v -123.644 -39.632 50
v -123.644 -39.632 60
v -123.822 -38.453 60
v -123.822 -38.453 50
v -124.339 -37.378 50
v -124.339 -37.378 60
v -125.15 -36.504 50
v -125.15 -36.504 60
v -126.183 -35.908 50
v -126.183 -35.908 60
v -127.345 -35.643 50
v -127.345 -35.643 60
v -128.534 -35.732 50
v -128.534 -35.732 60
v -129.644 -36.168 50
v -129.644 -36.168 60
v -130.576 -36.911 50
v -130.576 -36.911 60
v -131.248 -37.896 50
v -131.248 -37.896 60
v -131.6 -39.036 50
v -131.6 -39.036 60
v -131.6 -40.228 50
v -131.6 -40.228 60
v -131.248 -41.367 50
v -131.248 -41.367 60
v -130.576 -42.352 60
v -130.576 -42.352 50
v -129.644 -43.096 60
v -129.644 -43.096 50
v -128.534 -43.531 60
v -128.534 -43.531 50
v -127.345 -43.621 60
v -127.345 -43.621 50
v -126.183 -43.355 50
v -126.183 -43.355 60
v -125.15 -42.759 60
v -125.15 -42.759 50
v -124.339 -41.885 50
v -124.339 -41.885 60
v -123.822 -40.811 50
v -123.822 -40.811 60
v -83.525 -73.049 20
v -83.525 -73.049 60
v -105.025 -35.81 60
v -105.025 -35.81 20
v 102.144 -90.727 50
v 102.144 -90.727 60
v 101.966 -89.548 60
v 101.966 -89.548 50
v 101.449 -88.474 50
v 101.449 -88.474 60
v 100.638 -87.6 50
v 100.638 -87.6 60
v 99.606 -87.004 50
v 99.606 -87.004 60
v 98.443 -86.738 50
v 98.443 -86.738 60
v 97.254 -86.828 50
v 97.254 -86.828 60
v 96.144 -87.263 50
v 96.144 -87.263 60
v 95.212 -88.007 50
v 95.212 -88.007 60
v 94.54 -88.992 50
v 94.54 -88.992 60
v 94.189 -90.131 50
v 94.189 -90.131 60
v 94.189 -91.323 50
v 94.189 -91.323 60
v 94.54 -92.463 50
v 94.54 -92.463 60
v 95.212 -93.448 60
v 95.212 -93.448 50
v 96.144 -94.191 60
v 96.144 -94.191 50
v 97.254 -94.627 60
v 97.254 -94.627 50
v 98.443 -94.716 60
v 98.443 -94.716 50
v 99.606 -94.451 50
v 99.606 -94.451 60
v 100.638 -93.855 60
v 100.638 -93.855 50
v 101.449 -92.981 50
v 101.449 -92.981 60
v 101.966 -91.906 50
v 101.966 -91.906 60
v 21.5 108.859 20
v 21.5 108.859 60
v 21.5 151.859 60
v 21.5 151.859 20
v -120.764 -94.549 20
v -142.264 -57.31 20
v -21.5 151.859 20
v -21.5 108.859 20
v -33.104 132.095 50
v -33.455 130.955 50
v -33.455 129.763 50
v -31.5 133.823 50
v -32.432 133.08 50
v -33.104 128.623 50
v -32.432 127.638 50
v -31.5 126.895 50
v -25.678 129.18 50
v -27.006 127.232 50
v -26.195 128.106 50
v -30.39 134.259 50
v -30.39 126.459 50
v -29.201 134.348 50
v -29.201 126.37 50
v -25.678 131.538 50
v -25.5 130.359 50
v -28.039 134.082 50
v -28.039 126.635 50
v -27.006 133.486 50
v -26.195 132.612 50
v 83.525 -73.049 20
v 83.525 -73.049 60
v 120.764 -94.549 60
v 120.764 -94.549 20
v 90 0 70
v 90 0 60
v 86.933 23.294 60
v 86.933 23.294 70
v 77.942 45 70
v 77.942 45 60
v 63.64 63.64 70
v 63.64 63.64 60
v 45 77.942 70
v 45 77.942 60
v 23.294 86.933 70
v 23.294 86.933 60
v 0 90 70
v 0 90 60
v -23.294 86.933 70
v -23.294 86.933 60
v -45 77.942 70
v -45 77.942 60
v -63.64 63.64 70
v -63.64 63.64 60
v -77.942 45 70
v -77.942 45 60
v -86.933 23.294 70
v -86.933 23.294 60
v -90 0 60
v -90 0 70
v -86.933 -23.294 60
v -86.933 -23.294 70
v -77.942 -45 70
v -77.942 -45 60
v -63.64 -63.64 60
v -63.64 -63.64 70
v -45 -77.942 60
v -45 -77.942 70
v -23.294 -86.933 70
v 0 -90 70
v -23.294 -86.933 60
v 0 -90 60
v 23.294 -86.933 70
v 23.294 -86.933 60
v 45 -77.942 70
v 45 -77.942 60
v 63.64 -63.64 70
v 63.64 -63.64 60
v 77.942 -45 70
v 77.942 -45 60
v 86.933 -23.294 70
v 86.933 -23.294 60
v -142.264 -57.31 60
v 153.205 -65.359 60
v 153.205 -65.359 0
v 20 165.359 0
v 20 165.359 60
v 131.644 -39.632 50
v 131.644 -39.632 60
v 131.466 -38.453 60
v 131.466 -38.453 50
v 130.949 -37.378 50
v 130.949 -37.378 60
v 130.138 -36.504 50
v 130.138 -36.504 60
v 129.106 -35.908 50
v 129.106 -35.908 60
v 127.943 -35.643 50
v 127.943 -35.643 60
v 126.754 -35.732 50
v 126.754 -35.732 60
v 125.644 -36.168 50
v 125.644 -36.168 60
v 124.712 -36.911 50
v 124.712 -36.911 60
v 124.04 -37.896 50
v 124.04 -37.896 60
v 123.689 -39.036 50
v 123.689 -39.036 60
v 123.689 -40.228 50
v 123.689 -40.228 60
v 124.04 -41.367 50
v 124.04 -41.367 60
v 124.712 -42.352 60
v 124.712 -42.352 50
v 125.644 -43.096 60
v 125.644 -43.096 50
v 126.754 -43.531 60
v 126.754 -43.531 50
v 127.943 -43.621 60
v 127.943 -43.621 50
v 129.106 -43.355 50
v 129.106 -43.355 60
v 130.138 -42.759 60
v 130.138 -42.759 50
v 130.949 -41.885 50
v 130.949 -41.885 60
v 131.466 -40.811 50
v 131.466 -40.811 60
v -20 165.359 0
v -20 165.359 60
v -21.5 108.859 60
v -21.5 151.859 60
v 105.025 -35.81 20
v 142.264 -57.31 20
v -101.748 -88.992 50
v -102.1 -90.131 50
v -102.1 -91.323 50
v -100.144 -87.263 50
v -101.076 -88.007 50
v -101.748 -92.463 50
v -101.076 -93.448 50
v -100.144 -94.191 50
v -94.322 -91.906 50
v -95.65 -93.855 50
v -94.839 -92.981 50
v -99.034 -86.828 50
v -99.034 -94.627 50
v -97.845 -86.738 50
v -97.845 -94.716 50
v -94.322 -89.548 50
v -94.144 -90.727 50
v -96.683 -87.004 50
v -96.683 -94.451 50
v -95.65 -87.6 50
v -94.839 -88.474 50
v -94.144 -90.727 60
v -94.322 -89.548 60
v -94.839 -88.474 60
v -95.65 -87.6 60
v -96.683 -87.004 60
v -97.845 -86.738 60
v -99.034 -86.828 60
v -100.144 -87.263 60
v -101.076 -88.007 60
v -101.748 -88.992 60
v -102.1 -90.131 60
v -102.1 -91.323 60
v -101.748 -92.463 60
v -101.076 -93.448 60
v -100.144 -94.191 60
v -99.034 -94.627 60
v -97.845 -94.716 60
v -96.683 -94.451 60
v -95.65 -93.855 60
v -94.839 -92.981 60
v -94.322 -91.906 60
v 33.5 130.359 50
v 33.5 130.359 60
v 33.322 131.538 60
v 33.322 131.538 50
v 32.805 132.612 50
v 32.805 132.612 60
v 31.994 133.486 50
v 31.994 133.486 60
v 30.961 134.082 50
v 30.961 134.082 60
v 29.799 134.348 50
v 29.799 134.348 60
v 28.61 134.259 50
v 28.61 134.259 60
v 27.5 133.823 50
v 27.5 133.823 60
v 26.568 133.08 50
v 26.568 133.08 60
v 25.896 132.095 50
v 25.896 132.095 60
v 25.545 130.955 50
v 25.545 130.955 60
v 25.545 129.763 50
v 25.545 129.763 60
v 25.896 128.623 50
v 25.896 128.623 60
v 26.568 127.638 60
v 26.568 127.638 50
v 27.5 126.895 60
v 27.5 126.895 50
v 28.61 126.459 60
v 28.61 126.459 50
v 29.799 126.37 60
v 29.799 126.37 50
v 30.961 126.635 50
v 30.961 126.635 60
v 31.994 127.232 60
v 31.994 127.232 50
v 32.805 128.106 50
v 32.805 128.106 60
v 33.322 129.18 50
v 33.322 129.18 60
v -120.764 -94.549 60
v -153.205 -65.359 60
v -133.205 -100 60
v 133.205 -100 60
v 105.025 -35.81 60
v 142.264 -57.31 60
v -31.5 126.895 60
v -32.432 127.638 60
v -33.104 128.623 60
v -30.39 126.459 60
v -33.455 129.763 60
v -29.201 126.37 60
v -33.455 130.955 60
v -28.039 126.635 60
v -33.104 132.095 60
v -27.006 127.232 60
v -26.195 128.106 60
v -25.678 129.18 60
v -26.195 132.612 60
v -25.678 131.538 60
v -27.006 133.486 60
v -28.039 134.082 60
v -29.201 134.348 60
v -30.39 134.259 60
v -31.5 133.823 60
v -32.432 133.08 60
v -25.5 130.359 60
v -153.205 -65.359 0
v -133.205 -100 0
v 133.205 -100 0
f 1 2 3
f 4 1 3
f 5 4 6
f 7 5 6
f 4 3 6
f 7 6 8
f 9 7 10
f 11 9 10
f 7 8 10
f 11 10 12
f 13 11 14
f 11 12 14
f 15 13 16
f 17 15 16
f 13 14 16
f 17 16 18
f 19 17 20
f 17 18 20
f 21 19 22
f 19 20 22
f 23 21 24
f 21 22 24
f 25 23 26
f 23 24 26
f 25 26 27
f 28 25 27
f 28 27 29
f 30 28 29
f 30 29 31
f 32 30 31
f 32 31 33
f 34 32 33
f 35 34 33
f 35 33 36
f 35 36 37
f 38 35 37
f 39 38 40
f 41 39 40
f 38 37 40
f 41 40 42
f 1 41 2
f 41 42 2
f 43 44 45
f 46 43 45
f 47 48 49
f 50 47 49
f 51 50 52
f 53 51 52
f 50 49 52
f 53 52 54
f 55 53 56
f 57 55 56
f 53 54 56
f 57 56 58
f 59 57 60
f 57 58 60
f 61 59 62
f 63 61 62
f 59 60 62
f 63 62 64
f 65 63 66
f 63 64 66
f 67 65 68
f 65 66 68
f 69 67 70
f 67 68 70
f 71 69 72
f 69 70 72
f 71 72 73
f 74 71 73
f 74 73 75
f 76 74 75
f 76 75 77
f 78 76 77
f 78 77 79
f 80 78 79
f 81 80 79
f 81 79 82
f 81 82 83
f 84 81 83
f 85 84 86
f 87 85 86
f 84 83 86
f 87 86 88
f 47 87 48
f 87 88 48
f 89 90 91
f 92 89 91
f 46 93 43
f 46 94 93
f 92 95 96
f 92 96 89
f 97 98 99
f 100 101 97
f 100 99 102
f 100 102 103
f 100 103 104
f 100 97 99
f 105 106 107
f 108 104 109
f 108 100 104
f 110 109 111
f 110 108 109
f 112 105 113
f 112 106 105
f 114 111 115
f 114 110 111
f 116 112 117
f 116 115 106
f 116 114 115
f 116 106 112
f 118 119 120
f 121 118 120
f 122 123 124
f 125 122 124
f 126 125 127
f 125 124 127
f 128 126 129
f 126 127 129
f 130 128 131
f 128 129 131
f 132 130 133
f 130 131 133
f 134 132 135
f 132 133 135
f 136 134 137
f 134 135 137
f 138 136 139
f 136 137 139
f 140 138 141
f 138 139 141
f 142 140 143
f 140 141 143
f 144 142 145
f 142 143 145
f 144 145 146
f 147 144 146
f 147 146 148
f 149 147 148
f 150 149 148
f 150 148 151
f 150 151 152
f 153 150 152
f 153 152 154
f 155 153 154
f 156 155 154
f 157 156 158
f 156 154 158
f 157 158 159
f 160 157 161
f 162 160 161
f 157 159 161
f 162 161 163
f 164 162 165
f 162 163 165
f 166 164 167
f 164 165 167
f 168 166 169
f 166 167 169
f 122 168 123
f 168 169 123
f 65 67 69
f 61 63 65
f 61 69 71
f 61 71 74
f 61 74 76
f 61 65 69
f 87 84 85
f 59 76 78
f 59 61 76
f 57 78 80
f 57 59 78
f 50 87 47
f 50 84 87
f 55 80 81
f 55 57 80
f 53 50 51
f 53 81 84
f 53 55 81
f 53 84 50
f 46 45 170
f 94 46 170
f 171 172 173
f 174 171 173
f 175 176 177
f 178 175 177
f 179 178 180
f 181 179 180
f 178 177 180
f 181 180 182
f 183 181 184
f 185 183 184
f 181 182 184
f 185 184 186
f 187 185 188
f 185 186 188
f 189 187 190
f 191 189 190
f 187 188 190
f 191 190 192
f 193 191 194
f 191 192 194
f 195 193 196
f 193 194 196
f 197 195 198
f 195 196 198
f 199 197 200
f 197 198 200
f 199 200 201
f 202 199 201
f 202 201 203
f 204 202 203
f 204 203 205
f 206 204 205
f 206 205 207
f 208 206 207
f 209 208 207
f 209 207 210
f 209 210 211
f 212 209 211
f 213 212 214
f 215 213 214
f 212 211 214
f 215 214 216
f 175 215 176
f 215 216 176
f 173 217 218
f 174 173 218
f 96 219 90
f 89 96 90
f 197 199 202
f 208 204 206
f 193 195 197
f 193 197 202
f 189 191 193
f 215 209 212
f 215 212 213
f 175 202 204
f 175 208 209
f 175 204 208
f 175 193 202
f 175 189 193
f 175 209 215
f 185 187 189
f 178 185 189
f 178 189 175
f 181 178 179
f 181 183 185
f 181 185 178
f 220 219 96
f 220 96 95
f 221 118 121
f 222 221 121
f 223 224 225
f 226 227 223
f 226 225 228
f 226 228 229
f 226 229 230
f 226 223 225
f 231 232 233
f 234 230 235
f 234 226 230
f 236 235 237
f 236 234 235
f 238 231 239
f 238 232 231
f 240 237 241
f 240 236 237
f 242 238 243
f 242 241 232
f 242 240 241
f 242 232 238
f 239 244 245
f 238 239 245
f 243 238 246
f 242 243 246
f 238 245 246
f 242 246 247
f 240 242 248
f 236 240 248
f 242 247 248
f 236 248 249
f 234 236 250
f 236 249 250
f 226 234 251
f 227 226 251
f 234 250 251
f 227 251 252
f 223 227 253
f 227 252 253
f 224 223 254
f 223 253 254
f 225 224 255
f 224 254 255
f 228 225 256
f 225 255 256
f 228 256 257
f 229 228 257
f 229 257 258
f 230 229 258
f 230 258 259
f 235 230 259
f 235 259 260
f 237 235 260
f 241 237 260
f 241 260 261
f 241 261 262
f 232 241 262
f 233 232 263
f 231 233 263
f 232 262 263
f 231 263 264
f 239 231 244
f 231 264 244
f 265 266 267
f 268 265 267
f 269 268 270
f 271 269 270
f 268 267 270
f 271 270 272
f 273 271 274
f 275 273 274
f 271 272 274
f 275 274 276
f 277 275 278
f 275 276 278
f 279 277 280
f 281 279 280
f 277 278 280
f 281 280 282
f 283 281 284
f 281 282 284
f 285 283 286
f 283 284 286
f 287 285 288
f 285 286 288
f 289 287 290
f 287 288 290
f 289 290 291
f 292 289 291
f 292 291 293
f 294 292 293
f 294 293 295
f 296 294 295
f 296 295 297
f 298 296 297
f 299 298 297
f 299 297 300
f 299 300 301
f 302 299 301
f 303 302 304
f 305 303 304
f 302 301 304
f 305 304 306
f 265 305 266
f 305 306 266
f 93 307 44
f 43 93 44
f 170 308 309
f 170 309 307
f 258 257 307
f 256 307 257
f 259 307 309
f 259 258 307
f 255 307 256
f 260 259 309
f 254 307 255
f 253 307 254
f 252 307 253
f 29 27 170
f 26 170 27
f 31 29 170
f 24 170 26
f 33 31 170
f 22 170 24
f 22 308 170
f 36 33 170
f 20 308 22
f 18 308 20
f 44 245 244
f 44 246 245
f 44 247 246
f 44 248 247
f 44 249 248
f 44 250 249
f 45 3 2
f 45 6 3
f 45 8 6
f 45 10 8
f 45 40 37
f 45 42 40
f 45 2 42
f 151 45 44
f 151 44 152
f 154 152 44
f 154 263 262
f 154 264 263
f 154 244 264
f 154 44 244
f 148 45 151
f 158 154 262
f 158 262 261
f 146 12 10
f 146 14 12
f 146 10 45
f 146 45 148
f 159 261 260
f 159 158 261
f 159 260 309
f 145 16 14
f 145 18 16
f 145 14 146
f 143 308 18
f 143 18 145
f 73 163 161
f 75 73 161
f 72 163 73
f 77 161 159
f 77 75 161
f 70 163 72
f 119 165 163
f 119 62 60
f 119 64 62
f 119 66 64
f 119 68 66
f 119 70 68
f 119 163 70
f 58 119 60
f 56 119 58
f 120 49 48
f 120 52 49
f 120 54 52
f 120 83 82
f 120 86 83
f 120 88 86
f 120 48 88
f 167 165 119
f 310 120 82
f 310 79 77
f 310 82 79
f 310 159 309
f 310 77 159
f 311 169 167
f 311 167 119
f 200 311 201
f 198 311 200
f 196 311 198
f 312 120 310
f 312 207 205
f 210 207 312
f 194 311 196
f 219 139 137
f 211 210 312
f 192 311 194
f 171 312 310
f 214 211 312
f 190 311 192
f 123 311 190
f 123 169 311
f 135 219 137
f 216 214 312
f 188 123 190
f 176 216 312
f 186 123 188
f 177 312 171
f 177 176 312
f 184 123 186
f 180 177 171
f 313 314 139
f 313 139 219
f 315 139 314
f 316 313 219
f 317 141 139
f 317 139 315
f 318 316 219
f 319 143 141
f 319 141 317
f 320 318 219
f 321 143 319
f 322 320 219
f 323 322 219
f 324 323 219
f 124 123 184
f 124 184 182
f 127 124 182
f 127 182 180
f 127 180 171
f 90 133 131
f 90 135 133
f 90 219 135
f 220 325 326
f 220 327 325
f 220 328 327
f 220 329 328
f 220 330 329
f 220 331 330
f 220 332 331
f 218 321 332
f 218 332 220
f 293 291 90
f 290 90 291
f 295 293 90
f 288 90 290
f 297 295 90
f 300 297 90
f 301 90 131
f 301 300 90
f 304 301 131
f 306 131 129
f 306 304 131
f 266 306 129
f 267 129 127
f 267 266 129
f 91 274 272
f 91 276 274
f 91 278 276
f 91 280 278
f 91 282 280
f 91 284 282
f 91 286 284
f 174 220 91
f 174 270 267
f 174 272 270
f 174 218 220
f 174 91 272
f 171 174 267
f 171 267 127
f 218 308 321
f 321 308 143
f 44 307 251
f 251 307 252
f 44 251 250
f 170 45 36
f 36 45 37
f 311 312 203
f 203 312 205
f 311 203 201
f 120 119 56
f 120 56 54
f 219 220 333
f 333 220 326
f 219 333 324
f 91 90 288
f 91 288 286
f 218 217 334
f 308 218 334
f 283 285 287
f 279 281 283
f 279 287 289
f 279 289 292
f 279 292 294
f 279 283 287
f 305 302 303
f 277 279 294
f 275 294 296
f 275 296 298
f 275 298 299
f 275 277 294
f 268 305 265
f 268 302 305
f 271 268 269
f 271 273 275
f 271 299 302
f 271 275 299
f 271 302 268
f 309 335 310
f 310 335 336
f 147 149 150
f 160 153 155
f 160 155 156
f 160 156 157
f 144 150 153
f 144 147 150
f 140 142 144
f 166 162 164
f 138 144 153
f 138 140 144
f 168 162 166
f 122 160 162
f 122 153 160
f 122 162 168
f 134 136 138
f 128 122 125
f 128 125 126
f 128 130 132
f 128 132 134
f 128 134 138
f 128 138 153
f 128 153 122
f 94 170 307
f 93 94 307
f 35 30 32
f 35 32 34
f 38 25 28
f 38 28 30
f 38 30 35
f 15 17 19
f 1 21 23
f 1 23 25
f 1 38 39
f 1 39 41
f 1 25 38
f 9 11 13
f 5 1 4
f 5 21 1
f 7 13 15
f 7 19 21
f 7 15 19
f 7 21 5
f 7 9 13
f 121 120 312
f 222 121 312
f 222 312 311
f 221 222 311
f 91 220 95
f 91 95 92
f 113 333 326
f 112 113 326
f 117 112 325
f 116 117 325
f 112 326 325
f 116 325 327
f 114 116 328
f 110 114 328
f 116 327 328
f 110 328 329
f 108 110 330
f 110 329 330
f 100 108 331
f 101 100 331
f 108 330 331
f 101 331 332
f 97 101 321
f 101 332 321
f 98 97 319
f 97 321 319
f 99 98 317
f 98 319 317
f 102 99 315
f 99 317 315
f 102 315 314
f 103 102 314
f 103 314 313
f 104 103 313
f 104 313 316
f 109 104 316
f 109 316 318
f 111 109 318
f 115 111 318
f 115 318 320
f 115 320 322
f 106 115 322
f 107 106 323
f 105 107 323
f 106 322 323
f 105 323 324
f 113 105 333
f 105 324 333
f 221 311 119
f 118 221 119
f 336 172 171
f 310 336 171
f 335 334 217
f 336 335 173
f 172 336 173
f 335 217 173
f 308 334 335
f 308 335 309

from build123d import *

# Parameters (mm, degrees)
F1_DEPTH = 60
F2_SIZE  = 40
F3_R     = 90
F4_DEPTH = 10
F5_W     = 43
F5_H     = 43
F6_DEPTH = 40
F7_R     = 4
F8_DEPTH = 10


with BuildPart() as f1:
    # F0 (on Top) → F1 (new body)
    with BuildSketch(Plane.XY):
        Polygon((-173.205081, -100), (173.205081, -100), (0, 200), align=None)
    extrude(amount=F1_DEPTH)

    # F2
    f2_edges = [f1.edges().sort_by_distance(p)[0] for p in [
        (-173.205081, -100, 30),
        (173.205081, -100, 30),
        (0, 200, 30),
    ]]
    chamfer(f2_edges, length=F2_SIZE)

    # F3 (on face) → F4 (join)
    with BuildSketch(Plane.XY.offset(60)):
        Circle(F3_R)
    extrude(amount=F4_DEPTH)

    # F5 (on face) → F6 (cut)
    with BuildSketch(Plane.XY.offset(60)):
        with Locations((0, 130.358984)):
            Rectangle(F5_W, F5_H)
        Polygon((-120.763738, -94.549038), (-83.524645, -73.049038), (-105.024645, -35.809946), (-142.263738, -57.309946), align=None)
        Polygon((142.263738, -57.309946), (105.024645, -35.809946), (83.524645, -73.049038), (120.763738, -94.549038), align=None)
    extrude(amount=-F6_DEPTH, mode=Mode.SUBTRACT)

    # F7 (on face) → F8 (cut)
    with BuildSketch(Plane.XY.offset(60)):
        with Locations((-29.5, 130.358984)):
            Circle(F7_R)
        with Locations((29.5, 130.358984)):
            Circle(F7_R)
        with Locations((-98.144192, -90.727241)):
            Circle(F7_R)
        with Locations((-127.644192, -39.631743)):
            Circle(F7_R)
        with Locations((127.644192, -39.631743)):
            Circle(F7_R)
        with Locations((98.144192, -90.727241)):
            Circle(F7_R)
    extrude(amount=-F8_DEPTH, mode=Mode.SUBTRACT)


solid = f1.part
